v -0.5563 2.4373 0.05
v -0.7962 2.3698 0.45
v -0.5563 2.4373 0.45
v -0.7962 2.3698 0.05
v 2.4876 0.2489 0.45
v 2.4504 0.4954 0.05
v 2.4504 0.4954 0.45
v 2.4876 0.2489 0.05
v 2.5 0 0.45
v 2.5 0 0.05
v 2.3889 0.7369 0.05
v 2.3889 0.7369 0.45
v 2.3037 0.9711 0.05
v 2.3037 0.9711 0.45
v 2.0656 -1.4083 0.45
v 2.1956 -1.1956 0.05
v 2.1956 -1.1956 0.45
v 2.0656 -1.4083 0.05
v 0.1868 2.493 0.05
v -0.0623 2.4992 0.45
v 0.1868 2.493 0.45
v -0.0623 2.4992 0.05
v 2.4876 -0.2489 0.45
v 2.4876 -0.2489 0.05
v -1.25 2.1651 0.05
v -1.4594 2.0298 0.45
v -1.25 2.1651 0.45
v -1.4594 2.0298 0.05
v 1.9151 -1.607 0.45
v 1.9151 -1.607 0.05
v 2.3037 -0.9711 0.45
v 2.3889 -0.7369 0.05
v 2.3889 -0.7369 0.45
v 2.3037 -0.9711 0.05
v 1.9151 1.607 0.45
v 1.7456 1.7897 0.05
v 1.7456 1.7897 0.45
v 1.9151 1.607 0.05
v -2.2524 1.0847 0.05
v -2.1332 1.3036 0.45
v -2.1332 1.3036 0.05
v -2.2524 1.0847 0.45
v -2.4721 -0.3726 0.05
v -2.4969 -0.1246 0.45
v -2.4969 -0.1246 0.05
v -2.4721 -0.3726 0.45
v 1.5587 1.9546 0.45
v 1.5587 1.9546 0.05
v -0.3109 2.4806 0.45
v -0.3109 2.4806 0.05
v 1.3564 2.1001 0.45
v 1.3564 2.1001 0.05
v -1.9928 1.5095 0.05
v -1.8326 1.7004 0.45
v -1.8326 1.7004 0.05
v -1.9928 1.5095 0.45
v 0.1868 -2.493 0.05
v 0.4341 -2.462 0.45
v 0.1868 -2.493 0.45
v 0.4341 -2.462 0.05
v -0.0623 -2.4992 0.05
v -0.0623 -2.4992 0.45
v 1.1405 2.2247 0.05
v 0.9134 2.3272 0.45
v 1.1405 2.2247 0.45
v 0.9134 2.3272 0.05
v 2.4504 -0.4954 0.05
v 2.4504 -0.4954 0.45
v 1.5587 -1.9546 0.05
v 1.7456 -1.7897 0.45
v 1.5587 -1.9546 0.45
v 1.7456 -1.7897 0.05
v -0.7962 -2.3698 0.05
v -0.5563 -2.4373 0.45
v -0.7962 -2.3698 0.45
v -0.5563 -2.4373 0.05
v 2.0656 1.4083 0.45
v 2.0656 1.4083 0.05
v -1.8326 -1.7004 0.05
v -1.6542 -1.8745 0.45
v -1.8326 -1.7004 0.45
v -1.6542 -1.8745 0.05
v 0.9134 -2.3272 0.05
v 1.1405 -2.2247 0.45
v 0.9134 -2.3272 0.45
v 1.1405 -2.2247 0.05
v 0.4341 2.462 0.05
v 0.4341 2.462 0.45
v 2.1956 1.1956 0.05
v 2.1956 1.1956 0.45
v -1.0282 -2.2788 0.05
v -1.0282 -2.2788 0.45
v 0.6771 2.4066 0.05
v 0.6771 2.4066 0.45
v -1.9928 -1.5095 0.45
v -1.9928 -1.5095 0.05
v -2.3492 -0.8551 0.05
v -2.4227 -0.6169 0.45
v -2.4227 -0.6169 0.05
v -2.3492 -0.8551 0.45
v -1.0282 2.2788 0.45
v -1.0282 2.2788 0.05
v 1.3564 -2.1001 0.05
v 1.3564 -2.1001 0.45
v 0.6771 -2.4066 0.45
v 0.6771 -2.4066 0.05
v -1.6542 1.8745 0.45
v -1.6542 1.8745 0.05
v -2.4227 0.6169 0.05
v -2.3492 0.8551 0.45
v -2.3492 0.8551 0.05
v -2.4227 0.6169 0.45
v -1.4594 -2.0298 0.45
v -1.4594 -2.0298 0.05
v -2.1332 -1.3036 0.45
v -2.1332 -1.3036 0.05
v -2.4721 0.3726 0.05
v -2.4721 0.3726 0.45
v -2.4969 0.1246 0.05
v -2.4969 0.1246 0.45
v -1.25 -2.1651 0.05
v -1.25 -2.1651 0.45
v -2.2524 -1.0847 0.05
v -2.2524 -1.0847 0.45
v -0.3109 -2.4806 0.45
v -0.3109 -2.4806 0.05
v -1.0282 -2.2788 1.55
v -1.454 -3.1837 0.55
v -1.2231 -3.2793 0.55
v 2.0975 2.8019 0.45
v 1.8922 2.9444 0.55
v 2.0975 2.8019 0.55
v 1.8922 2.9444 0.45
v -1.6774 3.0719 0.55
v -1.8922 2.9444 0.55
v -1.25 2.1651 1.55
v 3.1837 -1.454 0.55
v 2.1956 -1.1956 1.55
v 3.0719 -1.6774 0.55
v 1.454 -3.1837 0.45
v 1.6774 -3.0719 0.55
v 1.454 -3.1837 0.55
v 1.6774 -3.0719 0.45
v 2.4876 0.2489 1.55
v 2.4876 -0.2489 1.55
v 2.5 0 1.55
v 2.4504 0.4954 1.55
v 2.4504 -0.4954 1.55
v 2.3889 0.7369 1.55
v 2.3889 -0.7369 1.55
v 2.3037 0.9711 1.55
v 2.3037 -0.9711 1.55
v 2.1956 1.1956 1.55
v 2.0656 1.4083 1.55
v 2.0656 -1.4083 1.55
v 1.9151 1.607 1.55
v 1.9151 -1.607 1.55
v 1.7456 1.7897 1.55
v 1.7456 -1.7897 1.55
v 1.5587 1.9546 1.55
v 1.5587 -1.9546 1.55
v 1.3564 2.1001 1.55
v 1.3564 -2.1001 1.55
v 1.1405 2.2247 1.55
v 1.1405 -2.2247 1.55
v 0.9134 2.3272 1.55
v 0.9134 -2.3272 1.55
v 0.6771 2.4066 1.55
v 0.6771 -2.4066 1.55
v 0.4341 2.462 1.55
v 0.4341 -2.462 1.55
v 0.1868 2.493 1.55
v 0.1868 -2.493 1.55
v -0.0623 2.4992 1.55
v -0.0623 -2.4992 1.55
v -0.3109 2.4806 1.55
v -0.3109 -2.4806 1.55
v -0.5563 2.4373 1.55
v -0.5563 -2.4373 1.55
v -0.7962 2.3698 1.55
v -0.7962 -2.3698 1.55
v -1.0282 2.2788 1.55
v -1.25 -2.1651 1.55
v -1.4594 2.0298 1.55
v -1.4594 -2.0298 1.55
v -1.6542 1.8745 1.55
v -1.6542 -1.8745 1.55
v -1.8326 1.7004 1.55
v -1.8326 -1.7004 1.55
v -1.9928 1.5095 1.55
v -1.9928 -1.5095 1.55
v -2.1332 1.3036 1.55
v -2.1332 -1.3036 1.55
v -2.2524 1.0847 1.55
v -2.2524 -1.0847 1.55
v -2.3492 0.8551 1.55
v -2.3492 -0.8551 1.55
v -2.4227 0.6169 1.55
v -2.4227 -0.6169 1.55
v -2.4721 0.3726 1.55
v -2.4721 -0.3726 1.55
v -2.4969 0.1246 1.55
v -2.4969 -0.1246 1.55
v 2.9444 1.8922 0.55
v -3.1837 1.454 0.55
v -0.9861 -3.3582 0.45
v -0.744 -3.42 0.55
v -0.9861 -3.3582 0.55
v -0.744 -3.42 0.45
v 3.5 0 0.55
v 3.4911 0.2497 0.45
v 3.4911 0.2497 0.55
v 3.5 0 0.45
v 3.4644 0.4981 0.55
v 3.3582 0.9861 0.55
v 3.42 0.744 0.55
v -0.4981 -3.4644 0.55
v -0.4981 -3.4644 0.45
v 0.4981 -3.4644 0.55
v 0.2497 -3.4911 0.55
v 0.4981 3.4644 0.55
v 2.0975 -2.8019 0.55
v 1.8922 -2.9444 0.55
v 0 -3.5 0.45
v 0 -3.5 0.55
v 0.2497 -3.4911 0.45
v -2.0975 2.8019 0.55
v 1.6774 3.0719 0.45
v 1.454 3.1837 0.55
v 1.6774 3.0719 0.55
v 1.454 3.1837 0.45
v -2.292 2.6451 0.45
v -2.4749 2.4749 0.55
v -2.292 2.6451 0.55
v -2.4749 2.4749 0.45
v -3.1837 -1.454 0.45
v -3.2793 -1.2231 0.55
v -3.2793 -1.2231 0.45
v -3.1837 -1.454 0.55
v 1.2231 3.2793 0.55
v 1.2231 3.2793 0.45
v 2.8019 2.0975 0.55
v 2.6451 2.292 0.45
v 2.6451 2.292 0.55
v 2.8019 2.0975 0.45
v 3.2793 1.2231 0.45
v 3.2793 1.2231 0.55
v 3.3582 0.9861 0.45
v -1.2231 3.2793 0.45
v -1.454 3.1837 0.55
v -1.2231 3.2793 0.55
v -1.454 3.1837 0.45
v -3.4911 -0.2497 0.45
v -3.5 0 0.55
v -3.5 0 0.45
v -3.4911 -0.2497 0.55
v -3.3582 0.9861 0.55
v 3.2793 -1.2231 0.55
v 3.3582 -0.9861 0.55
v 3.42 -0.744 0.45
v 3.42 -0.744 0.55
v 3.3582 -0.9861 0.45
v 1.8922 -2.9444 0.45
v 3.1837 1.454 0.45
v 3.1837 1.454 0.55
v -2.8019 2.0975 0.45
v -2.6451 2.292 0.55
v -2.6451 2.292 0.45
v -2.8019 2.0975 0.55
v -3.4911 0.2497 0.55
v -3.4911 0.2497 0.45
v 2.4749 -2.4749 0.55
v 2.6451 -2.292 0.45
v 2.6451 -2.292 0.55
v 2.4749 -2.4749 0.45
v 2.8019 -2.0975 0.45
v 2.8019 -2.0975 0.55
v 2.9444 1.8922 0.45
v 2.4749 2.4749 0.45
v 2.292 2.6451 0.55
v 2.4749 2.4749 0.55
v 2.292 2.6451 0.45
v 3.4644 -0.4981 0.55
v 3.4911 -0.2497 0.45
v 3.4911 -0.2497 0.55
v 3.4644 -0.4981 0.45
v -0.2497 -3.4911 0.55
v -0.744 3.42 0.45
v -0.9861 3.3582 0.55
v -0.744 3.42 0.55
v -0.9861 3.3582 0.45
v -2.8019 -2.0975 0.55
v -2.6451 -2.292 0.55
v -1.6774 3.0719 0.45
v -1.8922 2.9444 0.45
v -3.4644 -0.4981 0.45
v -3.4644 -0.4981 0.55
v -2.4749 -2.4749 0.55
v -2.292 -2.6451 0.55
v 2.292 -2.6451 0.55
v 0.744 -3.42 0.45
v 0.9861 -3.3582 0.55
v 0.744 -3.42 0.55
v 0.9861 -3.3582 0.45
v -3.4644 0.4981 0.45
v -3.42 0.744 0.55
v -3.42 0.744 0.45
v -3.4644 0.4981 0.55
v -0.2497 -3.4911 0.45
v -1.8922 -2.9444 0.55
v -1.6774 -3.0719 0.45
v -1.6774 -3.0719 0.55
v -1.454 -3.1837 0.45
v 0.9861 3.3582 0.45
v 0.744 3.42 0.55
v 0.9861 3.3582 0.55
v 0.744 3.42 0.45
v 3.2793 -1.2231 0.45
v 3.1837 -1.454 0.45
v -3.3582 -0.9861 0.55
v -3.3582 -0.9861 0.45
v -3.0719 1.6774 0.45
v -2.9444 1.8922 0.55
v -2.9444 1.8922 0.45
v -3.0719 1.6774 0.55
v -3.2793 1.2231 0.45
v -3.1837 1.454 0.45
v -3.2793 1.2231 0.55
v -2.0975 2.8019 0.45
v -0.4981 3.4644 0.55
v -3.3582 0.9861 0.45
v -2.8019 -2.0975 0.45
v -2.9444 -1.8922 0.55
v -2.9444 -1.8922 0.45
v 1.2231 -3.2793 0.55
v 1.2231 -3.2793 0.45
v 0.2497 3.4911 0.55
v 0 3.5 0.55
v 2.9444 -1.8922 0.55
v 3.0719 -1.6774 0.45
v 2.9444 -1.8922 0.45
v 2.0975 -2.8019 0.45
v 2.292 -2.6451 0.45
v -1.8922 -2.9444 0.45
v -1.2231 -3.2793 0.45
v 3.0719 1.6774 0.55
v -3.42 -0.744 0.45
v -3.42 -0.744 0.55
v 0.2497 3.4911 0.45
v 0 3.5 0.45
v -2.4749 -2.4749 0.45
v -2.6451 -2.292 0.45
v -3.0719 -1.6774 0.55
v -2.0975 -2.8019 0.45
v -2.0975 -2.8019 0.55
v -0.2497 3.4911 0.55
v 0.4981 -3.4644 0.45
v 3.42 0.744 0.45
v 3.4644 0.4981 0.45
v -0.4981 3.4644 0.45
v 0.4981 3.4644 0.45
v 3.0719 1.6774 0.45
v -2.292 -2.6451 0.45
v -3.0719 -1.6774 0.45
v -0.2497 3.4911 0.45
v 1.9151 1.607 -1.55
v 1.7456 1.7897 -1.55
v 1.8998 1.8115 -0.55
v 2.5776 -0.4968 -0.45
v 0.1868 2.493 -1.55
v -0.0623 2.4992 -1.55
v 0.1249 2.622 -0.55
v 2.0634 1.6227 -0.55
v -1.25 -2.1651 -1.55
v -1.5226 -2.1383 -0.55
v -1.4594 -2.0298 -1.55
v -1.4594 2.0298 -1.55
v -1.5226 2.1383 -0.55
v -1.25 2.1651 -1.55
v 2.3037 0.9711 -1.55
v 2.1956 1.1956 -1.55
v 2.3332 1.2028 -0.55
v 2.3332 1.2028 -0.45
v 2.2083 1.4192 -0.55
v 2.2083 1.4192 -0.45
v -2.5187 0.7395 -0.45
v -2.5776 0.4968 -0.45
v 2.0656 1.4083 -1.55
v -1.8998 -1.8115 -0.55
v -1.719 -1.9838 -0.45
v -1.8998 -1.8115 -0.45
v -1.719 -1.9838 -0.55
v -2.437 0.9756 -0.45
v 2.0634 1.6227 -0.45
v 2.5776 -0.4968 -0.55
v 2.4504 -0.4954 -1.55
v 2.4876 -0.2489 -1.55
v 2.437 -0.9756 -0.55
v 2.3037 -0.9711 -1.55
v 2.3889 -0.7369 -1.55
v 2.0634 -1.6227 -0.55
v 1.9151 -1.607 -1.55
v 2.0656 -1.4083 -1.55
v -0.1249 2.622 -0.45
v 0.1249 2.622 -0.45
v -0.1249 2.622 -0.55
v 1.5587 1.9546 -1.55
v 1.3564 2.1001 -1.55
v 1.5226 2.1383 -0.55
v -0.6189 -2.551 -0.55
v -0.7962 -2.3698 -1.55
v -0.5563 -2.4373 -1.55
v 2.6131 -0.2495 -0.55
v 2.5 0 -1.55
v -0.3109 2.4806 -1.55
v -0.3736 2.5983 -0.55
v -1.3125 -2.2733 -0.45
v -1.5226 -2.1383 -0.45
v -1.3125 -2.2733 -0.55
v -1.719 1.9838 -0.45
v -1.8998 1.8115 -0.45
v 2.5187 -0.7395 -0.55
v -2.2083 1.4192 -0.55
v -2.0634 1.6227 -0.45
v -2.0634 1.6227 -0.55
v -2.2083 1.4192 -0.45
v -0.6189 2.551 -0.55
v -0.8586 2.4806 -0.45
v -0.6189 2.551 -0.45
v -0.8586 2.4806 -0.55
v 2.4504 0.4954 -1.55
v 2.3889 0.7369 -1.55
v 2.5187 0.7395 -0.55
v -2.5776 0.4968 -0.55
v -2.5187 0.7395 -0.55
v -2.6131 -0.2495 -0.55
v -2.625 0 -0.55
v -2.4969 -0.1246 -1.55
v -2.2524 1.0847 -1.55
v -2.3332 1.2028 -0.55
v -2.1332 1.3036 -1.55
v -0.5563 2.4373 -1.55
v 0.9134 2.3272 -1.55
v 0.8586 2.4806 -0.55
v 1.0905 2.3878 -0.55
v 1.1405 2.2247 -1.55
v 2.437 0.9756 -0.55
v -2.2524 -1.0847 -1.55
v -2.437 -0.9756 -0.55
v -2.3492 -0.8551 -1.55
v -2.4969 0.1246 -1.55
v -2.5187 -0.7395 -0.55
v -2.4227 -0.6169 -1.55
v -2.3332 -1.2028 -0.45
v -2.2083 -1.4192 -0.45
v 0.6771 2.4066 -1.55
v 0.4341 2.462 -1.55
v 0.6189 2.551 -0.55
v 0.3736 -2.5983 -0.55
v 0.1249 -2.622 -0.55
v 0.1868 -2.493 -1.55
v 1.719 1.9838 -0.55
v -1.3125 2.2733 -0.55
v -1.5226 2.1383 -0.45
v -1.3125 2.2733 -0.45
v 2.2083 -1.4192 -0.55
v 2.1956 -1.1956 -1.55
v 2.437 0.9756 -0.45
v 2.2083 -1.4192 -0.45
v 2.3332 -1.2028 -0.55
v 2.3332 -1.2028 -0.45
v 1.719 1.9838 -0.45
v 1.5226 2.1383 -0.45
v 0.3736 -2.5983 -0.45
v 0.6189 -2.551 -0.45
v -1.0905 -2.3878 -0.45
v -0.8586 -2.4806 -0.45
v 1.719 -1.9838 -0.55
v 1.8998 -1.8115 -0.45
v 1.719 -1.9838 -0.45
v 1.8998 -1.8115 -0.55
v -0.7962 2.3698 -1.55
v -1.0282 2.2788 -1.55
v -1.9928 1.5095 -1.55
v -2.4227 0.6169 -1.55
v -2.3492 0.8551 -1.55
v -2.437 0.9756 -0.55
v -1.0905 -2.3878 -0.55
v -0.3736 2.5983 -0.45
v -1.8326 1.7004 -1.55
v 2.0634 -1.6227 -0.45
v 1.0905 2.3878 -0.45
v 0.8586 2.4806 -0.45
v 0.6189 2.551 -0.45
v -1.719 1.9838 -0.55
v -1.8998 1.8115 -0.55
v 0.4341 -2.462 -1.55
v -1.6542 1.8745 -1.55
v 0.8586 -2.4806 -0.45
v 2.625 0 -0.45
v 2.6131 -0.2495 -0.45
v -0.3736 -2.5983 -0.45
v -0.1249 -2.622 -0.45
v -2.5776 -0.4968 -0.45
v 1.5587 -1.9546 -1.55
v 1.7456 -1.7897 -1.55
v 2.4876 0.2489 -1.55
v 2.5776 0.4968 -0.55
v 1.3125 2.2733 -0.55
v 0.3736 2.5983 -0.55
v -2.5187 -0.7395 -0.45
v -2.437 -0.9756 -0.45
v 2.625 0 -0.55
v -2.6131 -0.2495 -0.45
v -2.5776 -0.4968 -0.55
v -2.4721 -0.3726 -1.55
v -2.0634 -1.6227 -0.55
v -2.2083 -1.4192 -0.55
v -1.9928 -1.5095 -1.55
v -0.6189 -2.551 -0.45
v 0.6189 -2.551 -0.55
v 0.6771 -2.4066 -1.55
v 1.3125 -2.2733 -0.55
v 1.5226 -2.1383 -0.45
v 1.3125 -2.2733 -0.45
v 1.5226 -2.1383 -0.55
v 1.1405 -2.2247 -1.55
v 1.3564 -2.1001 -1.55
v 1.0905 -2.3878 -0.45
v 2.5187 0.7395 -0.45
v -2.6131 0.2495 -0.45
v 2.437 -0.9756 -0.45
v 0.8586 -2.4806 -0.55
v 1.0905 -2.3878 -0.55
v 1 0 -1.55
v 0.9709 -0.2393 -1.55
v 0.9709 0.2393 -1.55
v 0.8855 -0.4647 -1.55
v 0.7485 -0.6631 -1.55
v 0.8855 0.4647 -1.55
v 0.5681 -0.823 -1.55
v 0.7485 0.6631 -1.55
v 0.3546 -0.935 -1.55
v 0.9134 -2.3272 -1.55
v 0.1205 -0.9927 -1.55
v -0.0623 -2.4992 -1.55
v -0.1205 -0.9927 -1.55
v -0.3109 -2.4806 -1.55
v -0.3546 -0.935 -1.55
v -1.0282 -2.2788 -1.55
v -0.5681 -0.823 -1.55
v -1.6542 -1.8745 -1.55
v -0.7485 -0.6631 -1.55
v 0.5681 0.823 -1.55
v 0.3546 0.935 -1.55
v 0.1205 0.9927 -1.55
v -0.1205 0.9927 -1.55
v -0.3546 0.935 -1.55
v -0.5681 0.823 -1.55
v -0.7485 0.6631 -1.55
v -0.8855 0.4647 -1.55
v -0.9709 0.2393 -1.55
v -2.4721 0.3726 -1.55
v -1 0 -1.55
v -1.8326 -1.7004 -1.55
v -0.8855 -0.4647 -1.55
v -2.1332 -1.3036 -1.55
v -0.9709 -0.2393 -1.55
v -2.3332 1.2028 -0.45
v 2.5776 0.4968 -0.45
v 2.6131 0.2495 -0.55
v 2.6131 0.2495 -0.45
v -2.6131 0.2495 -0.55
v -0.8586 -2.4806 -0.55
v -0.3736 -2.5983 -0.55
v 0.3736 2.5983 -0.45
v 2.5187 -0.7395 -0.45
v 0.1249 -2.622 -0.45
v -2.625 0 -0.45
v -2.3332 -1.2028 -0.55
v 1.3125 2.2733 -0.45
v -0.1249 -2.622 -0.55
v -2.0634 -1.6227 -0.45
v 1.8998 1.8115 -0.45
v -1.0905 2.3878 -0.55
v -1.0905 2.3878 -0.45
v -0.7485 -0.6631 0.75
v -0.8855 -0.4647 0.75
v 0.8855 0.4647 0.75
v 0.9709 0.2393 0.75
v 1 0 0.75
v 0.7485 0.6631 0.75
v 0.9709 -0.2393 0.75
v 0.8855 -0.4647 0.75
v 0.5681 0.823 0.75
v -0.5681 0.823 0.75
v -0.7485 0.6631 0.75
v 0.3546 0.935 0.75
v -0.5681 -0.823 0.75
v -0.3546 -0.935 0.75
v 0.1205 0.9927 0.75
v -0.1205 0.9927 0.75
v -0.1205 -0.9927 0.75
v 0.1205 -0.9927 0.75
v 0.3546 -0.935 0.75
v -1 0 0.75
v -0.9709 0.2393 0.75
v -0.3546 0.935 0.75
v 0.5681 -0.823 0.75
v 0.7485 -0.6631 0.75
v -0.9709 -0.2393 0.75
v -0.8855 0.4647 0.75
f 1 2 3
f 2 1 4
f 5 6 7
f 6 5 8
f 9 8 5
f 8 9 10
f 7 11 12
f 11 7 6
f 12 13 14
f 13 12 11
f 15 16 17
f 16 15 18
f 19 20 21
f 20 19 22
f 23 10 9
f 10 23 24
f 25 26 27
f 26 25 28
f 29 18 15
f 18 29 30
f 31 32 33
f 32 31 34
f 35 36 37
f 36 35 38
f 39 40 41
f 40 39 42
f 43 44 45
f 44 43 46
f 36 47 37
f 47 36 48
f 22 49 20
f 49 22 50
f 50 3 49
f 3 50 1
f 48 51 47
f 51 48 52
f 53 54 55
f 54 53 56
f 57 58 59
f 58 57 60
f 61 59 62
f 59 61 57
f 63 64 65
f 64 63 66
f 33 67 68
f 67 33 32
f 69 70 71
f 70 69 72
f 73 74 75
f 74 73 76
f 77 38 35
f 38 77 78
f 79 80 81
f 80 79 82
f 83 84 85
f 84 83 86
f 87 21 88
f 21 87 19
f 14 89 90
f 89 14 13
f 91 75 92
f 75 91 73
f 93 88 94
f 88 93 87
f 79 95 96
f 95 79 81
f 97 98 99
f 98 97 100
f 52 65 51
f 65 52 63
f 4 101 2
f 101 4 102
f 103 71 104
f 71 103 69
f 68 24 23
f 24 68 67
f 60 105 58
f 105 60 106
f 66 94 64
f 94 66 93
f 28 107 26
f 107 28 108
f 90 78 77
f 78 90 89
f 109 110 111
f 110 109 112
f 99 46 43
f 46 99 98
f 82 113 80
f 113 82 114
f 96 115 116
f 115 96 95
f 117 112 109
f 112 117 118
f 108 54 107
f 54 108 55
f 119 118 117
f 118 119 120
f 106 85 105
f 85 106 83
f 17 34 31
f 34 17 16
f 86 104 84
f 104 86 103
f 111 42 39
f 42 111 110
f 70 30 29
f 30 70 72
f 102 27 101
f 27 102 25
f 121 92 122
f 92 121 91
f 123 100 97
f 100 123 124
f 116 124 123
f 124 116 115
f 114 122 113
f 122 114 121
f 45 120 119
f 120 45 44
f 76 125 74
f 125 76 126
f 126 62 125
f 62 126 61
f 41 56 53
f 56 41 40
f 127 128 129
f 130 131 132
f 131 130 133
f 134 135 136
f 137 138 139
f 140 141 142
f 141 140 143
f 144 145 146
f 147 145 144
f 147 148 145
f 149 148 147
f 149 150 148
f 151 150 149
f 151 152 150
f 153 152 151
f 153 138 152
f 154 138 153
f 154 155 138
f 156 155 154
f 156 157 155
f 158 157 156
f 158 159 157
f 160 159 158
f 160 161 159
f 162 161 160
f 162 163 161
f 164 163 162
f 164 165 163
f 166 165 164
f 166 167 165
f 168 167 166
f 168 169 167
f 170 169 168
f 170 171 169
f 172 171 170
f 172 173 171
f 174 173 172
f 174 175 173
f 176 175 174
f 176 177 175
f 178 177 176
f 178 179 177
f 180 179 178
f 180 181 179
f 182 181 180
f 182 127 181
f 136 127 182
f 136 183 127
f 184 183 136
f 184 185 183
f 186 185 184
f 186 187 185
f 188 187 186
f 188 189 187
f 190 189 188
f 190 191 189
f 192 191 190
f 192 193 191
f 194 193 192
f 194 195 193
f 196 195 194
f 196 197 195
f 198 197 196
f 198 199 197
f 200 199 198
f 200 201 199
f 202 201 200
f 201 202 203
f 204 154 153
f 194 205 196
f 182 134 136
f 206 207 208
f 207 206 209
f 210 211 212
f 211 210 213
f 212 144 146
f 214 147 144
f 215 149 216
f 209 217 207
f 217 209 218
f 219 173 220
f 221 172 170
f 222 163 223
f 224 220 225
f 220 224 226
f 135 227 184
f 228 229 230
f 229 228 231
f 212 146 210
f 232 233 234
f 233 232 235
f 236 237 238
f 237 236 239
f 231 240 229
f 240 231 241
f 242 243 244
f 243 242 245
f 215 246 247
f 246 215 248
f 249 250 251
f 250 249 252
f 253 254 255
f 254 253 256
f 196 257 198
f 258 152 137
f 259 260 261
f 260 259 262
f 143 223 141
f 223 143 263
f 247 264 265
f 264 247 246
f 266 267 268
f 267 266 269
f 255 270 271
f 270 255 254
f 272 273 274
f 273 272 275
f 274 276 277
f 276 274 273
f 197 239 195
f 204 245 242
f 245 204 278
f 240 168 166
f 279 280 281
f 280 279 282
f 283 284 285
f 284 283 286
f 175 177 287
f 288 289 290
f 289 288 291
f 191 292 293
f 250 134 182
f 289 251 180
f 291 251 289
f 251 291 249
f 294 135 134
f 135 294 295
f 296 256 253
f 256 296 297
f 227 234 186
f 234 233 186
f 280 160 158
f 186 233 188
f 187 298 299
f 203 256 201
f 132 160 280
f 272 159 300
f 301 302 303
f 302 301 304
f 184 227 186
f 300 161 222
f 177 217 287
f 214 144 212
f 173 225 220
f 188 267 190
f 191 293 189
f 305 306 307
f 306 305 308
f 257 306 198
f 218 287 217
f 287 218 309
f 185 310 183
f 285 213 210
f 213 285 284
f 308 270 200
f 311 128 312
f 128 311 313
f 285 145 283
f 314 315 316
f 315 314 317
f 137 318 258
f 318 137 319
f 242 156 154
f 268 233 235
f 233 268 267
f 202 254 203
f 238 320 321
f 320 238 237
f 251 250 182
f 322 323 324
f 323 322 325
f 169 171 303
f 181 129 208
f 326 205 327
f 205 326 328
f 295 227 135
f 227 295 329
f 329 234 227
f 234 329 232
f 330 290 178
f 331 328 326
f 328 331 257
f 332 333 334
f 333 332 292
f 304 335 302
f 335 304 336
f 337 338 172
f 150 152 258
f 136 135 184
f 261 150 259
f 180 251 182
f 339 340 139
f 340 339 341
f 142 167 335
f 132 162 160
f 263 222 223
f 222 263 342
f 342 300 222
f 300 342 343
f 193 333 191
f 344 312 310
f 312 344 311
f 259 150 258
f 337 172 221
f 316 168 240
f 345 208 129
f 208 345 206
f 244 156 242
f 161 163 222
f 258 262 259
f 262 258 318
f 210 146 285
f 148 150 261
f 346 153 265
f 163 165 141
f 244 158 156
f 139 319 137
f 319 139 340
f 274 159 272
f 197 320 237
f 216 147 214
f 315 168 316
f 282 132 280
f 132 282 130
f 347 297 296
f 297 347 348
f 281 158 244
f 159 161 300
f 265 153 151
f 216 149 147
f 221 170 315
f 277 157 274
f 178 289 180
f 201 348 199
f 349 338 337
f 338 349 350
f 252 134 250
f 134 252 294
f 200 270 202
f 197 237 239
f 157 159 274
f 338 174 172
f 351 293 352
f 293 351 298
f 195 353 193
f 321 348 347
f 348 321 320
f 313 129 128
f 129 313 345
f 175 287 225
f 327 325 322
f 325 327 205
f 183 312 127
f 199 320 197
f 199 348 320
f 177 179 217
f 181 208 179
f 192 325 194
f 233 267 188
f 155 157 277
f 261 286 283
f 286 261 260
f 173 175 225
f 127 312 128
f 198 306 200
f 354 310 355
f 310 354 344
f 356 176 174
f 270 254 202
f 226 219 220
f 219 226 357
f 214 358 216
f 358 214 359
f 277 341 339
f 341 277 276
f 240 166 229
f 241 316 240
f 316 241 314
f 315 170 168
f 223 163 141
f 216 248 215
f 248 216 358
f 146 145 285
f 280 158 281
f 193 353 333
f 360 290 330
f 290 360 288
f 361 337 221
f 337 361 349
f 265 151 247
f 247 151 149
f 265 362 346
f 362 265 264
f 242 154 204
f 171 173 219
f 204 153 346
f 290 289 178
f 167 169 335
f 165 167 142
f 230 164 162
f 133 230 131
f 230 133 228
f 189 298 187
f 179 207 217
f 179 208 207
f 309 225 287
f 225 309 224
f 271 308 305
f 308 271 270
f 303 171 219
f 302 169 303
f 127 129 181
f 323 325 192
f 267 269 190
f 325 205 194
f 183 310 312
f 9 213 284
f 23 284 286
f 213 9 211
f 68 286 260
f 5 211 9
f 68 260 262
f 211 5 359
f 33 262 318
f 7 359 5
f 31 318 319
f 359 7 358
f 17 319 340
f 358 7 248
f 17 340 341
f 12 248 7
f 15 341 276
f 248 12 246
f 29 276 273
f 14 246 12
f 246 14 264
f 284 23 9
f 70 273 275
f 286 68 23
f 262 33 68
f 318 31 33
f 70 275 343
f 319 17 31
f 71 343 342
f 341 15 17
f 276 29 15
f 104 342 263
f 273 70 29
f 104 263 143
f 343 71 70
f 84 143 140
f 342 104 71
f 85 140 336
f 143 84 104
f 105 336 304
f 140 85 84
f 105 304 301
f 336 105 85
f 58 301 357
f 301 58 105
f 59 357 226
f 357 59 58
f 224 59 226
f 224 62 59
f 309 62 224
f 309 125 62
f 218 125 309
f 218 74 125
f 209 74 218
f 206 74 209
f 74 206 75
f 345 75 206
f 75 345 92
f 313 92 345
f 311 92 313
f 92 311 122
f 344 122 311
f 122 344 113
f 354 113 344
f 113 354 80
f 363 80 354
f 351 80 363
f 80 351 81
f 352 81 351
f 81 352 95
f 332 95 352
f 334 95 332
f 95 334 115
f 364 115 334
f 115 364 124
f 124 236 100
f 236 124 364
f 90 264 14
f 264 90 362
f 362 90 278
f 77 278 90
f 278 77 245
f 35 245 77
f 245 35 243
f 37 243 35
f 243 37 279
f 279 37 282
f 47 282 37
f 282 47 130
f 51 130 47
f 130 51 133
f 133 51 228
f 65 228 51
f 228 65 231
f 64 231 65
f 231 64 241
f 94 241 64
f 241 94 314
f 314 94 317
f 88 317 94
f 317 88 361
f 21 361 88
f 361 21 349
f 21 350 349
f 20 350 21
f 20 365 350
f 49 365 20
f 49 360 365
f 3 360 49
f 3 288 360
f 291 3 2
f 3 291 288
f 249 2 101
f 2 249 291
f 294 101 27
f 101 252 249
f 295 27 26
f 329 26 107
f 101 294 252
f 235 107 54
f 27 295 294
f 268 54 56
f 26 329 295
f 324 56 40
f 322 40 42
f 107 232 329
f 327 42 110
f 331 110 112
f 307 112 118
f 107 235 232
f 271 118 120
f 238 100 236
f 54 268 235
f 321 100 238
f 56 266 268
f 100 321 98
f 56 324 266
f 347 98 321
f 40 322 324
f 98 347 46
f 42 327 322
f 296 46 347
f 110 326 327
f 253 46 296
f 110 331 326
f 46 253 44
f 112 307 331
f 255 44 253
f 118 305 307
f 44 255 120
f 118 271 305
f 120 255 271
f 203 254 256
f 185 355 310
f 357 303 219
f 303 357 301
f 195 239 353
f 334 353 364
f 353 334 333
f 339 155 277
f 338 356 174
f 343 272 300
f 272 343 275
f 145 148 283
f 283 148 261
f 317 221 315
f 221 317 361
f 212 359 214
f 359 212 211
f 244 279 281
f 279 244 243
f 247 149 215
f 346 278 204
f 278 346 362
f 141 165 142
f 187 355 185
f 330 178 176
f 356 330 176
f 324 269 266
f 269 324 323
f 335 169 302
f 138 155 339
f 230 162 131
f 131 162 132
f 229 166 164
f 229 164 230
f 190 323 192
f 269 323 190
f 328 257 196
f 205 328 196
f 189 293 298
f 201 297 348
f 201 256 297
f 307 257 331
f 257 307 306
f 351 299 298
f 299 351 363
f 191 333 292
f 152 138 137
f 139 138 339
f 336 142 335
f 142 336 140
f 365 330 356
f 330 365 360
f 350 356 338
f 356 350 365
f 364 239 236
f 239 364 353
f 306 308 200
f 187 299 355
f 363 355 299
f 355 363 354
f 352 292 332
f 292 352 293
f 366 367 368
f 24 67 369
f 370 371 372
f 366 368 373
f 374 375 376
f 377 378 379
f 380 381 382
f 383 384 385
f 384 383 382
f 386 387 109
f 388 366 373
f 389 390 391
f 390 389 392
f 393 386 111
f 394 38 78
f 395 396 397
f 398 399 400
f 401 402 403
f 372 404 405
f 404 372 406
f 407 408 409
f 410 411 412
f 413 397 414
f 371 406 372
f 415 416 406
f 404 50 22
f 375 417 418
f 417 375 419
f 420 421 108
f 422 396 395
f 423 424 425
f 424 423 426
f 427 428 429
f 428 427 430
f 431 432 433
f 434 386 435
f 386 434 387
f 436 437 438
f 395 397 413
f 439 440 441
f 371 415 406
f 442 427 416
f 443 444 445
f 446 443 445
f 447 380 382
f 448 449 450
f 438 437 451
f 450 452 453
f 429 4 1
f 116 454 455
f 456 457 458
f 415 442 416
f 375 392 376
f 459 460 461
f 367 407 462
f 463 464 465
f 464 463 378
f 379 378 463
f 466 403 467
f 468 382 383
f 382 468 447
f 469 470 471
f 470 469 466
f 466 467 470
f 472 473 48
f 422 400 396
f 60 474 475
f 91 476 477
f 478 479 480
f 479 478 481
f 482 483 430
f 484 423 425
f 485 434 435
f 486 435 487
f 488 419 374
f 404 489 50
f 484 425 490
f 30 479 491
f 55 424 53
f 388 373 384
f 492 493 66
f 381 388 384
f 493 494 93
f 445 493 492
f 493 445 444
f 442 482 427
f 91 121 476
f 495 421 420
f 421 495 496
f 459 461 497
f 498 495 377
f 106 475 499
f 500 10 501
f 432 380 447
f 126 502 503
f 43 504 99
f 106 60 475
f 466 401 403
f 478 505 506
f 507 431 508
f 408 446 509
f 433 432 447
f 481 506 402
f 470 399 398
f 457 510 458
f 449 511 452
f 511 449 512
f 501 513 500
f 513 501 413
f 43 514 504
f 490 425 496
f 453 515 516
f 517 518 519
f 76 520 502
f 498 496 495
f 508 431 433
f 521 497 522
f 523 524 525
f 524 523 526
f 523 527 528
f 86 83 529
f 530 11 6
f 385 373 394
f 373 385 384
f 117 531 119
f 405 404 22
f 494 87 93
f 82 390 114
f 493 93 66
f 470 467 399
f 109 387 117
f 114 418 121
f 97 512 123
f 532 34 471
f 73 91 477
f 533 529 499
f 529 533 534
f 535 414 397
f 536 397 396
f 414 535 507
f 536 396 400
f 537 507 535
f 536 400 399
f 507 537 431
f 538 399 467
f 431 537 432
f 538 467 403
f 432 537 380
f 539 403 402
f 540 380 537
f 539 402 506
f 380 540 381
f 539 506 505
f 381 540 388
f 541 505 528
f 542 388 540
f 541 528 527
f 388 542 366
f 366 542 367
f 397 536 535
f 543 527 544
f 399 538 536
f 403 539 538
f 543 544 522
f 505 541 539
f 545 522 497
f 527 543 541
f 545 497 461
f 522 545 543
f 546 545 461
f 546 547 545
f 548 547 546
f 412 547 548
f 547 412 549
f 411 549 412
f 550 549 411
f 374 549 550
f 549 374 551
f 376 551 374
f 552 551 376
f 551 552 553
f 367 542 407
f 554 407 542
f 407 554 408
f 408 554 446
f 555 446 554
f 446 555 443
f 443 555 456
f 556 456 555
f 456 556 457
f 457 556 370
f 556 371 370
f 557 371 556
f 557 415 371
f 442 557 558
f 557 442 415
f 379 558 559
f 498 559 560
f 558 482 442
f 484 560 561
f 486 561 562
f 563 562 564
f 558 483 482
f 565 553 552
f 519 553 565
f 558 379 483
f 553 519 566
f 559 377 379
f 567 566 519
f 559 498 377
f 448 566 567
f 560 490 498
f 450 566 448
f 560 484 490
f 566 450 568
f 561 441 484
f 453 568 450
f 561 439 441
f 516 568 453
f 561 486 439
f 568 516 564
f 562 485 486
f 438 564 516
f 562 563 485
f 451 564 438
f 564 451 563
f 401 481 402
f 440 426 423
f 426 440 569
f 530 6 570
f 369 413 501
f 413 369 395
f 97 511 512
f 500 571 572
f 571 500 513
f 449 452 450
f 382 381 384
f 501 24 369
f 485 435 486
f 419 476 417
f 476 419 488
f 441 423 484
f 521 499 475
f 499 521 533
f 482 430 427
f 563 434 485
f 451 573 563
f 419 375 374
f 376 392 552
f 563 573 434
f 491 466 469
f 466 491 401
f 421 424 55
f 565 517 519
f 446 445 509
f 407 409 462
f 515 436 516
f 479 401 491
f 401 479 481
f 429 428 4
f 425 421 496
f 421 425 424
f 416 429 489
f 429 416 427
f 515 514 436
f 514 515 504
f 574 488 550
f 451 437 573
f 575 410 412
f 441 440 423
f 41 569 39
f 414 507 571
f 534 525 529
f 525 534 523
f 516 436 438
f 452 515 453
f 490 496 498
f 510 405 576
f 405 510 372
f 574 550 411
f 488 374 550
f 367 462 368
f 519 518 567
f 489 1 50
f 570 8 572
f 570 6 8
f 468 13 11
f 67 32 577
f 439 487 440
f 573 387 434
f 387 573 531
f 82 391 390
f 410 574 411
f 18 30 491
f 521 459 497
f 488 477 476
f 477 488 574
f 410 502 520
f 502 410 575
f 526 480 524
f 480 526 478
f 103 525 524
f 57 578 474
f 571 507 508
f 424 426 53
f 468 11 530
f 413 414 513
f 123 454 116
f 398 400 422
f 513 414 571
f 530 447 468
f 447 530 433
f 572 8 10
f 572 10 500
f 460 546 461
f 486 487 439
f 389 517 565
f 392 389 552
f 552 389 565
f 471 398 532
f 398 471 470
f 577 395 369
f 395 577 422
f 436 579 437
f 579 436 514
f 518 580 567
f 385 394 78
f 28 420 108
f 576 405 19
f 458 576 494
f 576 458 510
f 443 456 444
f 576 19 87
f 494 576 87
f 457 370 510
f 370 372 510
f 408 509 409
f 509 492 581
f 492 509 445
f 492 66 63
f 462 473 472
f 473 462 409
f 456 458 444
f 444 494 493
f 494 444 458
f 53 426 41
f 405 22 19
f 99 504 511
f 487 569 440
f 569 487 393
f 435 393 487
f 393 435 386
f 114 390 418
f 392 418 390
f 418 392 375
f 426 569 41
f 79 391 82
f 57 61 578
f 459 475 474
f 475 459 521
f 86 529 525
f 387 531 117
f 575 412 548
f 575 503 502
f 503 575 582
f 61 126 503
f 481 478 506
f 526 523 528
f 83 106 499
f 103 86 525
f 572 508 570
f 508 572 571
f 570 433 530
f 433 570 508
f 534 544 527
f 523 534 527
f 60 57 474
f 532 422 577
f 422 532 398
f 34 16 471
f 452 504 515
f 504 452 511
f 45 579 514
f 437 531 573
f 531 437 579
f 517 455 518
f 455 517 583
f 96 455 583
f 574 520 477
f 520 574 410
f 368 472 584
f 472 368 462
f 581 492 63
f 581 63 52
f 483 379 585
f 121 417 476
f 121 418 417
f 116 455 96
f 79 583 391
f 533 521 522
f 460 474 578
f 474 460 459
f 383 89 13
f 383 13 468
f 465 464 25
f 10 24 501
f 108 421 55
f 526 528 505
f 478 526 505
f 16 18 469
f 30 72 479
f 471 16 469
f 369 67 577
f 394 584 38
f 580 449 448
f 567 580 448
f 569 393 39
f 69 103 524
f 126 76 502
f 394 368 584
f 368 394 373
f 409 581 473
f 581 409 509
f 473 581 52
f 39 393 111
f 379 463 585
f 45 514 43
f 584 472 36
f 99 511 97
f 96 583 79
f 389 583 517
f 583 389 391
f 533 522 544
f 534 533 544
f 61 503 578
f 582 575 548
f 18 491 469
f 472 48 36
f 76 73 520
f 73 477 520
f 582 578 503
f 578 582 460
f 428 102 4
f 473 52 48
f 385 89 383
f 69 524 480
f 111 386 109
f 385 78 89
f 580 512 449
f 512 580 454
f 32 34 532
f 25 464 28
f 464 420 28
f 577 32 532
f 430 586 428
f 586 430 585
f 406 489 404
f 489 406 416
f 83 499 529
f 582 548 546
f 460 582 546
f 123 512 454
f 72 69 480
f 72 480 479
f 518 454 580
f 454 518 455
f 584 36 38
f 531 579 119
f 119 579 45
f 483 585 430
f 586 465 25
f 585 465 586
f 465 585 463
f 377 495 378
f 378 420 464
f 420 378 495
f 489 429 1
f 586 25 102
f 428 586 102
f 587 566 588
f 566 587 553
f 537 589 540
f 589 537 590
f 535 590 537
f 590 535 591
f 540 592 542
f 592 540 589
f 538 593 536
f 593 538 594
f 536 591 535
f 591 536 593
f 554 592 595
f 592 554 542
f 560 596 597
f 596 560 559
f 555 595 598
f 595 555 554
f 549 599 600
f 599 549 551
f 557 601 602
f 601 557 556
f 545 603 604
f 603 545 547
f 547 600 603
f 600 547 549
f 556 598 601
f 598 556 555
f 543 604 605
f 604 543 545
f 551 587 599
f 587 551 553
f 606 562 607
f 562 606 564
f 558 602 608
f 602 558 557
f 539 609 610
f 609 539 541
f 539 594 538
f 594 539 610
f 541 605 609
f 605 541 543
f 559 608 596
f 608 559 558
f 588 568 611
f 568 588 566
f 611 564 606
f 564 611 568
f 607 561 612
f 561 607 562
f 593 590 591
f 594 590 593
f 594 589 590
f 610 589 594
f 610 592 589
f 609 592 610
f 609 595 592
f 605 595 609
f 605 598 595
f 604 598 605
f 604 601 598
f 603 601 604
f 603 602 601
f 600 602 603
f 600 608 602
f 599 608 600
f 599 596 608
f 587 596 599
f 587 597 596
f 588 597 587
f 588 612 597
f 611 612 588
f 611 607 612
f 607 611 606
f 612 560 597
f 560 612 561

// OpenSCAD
$fs = 0.25;
$fa = 1;

hole_diameter = 5;

difference()
{
  union()
  {
    cylinder(d=hole_diameter, h=3, center=true);
    hull()
    {
      translate([0,0,1.5])  cylinder(d=hole_diameter, h=0.1, center=true);
      translate([0,0,0.5])  cylinder(d=hole_diameter+2, h=0.1, center=true);
    }
    hull()
    {
      translate([0,0,-1.5]) cylinder( d=hole_diameter, h=0.1, center=true);
      translate([0,0,-0.5])   cylinder( d=hole_diameter+0.25, h=0.1, center=true);
      translate([0,0,0])    cylinder( d=hole_diameter, h=0.1, center=true);
    }
  }
  translate([0,0,-0.5])   cylinder( d=hole_diameter-3, h=2.5, center=true);
}
